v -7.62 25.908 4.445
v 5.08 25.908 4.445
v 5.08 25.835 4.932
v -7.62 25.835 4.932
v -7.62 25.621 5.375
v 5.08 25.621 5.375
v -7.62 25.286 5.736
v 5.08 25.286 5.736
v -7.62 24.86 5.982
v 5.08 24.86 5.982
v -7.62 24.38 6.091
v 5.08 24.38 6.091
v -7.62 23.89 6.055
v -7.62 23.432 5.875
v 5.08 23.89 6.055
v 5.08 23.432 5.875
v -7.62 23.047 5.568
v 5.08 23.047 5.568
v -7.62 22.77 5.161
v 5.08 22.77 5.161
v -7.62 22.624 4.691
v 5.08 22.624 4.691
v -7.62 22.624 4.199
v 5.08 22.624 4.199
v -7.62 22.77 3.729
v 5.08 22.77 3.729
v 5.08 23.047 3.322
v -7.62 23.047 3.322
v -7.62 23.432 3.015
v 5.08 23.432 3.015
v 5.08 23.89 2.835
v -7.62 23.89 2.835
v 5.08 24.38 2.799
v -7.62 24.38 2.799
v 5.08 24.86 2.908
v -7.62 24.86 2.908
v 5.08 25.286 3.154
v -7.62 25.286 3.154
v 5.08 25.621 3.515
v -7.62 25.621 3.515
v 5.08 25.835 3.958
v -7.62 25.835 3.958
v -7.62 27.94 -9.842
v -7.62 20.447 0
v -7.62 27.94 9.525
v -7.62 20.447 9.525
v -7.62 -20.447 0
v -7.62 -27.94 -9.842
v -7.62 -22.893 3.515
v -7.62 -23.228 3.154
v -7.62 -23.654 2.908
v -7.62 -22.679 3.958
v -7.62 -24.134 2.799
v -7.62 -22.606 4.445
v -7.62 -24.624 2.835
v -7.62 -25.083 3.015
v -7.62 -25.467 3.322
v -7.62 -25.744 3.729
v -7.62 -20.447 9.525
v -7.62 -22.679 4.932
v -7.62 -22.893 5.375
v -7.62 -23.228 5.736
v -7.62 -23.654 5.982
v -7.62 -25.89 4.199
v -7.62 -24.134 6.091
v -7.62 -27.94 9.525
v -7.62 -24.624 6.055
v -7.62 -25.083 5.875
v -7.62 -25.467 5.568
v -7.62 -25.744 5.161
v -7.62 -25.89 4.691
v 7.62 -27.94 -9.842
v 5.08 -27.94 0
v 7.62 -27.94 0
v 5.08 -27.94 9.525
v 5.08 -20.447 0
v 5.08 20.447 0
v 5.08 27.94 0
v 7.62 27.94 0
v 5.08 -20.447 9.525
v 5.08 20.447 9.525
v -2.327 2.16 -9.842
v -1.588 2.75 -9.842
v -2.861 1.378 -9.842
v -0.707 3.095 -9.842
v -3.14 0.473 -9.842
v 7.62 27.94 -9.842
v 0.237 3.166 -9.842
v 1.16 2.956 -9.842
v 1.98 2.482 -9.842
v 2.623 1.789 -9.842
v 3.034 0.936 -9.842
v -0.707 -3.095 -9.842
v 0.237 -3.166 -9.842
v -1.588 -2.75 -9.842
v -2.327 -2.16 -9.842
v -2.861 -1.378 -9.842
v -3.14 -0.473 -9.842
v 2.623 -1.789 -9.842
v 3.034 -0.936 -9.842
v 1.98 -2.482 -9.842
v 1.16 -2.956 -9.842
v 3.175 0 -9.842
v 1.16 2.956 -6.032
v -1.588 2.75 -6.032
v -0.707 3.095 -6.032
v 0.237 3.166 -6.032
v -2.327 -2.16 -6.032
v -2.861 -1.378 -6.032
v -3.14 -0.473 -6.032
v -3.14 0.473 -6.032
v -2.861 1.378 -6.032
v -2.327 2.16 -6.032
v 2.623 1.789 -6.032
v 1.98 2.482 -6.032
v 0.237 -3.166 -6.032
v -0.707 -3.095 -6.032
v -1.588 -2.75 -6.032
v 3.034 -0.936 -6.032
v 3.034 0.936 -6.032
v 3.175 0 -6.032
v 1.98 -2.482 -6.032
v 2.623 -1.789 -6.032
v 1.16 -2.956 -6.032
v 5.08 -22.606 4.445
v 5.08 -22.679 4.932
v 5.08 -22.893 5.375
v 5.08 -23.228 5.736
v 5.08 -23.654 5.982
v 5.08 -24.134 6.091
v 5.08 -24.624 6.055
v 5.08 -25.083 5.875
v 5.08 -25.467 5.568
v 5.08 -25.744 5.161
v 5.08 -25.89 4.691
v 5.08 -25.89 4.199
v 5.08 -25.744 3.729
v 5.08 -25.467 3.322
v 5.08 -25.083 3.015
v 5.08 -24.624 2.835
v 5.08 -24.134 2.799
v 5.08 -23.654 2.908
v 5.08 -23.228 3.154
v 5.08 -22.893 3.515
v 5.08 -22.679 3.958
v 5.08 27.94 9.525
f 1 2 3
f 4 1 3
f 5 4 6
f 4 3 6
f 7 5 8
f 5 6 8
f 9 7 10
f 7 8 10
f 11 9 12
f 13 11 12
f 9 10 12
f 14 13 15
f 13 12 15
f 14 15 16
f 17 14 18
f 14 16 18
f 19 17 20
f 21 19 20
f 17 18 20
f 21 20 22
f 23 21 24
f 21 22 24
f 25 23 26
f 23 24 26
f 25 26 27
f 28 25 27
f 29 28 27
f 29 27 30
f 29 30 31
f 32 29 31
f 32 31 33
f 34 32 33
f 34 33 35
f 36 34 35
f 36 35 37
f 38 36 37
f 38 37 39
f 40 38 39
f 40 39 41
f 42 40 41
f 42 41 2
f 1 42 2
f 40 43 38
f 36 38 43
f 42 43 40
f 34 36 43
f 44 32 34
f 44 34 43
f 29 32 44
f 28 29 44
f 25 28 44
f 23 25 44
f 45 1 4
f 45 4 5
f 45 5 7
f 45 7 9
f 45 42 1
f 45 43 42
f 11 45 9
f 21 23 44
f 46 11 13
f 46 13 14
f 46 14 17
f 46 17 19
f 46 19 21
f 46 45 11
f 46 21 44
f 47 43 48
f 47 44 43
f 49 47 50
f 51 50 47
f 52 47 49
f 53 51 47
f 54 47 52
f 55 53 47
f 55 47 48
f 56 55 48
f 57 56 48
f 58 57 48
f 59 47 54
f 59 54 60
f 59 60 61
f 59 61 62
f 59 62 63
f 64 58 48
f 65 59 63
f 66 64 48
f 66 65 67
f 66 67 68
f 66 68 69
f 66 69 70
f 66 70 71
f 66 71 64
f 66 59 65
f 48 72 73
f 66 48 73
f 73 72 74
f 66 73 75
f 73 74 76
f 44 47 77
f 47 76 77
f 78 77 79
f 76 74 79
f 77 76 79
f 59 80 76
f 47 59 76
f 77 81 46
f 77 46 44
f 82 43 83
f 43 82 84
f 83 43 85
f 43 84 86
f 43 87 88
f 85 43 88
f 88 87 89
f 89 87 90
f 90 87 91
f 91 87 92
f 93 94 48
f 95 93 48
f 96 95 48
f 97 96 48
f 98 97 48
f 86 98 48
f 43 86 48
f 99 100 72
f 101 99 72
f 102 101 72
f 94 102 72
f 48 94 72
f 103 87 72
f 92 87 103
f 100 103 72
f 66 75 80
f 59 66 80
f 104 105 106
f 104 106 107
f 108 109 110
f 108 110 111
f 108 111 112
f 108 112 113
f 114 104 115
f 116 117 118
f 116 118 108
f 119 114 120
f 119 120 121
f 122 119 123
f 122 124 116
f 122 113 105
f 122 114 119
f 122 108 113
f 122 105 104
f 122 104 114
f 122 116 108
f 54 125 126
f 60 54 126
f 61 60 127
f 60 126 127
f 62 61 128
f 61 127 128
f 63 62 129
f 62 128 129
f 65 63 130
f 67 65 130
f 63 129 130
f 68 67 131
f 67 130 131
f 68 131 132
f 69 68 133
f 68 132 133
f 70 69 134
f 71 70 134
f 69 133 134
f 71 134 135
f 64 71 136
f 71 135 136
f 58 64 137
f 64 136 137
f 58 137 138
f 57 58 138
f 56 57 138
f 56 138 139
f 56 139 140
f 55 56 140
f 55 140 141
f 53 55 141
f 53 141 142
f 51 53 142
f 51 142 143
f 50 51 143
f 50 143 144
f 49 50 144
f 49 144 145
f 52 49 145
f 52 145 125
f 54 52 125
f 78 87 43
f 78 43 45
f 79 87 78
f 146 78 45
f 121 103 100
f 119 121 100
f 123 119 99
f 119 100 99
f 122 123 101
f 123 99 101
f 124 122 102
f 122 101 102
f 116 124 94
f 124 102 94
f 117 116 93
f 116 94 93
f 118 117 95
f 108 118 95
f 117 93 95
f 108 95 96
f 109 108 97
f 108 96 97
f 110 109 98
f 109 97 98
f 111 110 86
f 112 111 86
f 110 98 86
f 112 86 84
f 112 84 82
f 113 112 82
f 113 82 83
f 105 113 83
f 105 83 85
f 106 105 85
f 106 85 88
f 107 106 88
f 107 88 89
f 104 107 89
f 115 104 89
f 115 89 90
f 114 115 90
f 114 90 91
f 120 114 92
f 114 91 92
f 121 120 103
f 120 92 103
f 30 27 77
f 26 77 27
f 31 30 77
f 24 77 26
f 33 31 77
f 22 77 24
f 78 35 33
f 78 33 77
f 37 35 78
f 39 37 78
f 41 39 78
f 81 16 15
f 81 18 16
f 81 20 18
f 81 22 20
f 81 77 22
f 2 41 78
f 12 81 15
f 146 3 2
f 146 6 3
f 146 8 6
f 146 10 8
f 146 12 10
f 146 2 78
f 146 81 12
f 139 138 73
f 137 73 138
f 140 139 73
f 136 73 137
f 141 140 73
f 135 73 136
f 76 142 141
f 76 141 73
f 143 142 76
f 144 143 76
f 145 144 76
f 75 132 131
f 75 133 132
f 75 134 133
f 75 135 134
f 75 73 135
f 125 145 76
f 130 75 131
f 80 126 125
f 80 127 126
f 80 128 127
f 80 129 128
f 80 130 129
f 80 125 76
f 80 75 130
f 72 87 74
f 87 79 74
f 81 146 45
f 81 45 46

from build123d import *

# Parameters (mm, degrees)
F1_DEPTH = 7.62
F3_R     = 1.651
F4_DEPTH = 25.4
F5_R     = 3.175
F6_DEPTH = 3.81
F7_W     = 55.88
F7_H     = 9.525
F8_DEPTH = 2.54


with BuildPart() as f1:
    # F0 (on Right) → F1 (new body, symmetric)
    with BuildSketch(Plane.YZ):
        Polygon((0, 0), (0, -9.8425), (27.94, -9.8425), (27.94, 9.525), (20.447, 9.525), (20.447, 0), align=None)
    extrude(amount=F1_DEPTH, both=True)

    # F2: F1 across plane


with BuildPart() as f1_1:
    add(f1.part)
    add(f1.part.mirror(Plane.XZ))

    # F3 (on face) → F4 (cut)
    with BuildSketch(Plane.YZ.offset(7.62)):
        with Locations((-24.257, 4.445)):
            Circle(F3_R)
        with Locations((24.257, 4.445)):
            Circle(F3_R)
    extrude(amount=-F4_DEPTH, mode=Mode.SUBTRACT)

    # F5 (on face) → F6 (cut)
    with BuildSketch(Plane(origin=(0, 0, -9.8425), x_dir=(1, 0, 0), z_dir=(0, 0, -1))):
        Circle(F5_R)
    extrude(amount=-F6_DEPTH, mode=Mode.SUBTRACT)

    # F7 (on face) → F8 (cut)
    with BuildSketch(Plane.YZ.offset(7.62)):
        with Locations((0, 4.7625)):
            Rectangle(F7_W, F7_H)
    extrude(amount=-F8_DEPTH, mode=Mode.SUBTRACT)


solid = f1_1.part
